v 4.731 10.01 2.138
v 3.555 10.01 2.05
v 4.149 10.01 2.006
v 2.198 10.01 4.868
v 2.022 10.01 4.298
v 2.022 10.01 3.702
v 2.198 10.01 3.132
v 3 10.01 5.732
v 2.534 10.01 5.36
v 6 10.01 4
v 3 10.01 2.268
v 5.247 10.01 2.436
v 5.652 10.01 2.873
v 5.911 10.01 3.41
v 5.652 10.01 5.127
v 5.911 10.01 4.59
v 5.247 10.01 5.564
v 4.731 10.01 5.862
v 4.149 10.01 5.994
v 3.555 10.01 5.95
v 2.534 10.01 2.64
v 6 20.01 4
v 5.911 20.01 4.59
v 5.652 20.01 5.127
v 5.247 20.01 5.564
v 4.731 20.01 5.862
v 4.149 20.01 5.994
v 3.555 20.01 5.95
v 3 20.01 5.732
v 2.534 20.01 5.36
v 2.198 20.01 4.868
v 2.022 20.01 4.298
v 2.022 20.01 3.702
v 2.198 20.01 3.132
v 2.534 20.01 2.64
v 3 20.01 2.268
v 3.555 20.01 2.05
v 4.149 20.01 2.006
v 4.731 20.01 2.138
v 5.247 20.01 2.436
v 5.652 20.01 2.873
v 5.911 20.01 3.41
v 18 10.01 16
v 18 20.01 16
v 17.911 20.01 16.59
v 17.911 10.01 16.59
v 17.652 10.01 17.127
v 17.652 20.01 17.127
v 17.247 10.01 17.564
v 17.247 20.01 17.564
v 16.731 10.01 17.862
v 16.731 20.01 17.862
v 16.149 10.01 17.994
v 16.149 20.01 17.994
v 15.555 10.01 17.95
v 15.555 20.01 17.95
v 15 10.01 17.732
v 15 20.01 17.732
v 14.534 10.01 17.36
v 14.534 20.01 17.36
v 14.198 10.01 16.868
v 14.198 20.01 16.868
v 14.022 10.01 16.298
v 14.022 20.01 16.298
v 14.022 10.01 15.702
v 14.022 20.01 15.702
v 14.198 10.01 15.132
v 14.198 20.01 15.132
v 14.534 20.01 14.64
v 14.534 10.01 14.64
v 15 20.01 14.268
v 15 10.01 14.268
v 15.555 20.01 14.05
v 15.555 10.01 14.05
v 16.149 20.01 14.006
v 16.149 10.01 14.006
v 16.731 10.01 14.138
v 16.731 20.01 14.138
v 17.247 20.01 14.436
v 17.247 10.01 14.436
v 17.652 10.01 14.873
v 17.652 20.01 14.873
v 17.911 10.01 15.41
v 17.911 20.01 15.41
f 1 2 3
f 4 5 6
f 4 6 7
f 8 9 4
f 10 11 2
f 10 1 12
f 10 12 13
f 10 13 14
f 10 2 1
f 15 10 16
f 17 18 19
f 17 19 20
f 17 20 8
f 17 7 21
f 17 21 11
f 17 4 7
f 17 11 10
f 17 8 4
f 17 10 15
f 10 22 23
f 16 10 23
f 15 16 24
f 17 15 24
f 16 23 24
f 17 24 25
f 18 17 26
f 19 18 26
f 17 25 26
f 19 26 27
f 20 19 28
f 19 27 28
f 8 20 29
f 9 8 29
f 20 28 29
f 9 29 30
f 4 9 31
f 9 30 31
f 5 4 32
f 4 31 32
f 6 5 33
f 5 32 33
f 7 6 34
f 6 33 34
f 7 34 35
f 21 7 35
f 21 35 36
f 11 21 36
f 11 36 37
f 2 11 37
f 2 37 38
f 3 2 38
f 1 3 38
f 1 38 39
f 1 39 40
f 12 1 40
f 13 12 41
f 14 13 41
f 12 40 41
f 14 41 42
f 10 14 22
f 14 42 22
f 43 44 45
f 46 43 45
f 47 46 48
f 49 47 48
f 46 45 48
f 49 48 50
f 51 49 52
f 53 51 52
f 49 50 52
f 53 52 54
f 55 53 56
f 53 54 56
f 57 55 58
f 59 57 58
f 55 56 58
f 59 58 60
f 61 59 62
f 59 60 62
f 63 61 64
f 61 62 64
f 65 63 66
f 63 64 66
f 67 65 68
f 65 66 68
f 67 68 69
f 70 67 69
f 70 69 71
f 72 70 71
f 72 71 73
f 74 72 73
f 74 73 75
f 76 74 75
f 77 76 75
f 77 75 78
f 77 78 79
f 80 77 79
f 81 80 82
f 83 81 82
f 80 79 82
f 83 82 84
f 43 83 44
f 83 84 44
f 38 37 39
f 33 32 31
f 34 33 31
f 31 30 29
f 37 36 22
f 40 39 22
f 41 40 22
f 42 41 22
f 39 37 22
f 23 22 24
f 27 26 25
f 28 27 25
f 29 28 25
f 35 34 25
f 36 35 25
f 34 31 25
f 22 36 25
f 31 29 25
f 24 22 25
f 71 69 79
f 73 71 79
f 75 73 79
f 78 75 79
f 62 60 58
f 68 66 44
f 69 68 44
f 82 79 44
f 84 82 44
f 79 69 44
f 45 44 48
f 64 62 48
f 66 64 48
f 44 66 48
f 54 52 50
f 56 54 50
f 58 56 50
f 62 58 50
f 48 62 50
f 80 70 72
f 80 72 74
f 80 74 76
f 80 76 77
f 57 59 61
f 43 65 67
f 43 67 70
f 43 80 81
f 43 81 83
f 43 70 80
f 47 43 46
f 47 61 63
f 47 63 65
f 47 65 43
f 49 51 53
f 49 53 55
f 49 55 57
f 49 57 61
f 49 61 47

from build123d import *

# Parameters (mm, degrees)
CYLINDER006_R     = 2
CYLINDER006_DEPTH = 10
CYLINDER005_R     = 2
CYLINDER005_DEPTH = 10


with BuildPart() as cilindre006:
    # Cylinder006 → Cylinder006 (new body)
    with BuildSketch(Plane(origin=(4, 20.01, 4), x_dir=(1, 0, 0), z_dir=(0, -1, 0))):
        Circle(CYLINDER006_R)
    extrude(amount=CYLINDER006_DEPTH)


with BuildPart() as fusion:
    # Cylinder005 → Cylinder005 (new body)
    with BuildSketch(Plane(origin=(16, 20.01, 16), x_dir=(1, 0, 0), z_dir=(0, -1, 0))):
        Circle(CYLINDER005_R)
    extrude(amount=CYLINDER005_DEPTH)

    # Fusion: union Cilindre006
    add(cilindre006.part)


solid = fusion.part
